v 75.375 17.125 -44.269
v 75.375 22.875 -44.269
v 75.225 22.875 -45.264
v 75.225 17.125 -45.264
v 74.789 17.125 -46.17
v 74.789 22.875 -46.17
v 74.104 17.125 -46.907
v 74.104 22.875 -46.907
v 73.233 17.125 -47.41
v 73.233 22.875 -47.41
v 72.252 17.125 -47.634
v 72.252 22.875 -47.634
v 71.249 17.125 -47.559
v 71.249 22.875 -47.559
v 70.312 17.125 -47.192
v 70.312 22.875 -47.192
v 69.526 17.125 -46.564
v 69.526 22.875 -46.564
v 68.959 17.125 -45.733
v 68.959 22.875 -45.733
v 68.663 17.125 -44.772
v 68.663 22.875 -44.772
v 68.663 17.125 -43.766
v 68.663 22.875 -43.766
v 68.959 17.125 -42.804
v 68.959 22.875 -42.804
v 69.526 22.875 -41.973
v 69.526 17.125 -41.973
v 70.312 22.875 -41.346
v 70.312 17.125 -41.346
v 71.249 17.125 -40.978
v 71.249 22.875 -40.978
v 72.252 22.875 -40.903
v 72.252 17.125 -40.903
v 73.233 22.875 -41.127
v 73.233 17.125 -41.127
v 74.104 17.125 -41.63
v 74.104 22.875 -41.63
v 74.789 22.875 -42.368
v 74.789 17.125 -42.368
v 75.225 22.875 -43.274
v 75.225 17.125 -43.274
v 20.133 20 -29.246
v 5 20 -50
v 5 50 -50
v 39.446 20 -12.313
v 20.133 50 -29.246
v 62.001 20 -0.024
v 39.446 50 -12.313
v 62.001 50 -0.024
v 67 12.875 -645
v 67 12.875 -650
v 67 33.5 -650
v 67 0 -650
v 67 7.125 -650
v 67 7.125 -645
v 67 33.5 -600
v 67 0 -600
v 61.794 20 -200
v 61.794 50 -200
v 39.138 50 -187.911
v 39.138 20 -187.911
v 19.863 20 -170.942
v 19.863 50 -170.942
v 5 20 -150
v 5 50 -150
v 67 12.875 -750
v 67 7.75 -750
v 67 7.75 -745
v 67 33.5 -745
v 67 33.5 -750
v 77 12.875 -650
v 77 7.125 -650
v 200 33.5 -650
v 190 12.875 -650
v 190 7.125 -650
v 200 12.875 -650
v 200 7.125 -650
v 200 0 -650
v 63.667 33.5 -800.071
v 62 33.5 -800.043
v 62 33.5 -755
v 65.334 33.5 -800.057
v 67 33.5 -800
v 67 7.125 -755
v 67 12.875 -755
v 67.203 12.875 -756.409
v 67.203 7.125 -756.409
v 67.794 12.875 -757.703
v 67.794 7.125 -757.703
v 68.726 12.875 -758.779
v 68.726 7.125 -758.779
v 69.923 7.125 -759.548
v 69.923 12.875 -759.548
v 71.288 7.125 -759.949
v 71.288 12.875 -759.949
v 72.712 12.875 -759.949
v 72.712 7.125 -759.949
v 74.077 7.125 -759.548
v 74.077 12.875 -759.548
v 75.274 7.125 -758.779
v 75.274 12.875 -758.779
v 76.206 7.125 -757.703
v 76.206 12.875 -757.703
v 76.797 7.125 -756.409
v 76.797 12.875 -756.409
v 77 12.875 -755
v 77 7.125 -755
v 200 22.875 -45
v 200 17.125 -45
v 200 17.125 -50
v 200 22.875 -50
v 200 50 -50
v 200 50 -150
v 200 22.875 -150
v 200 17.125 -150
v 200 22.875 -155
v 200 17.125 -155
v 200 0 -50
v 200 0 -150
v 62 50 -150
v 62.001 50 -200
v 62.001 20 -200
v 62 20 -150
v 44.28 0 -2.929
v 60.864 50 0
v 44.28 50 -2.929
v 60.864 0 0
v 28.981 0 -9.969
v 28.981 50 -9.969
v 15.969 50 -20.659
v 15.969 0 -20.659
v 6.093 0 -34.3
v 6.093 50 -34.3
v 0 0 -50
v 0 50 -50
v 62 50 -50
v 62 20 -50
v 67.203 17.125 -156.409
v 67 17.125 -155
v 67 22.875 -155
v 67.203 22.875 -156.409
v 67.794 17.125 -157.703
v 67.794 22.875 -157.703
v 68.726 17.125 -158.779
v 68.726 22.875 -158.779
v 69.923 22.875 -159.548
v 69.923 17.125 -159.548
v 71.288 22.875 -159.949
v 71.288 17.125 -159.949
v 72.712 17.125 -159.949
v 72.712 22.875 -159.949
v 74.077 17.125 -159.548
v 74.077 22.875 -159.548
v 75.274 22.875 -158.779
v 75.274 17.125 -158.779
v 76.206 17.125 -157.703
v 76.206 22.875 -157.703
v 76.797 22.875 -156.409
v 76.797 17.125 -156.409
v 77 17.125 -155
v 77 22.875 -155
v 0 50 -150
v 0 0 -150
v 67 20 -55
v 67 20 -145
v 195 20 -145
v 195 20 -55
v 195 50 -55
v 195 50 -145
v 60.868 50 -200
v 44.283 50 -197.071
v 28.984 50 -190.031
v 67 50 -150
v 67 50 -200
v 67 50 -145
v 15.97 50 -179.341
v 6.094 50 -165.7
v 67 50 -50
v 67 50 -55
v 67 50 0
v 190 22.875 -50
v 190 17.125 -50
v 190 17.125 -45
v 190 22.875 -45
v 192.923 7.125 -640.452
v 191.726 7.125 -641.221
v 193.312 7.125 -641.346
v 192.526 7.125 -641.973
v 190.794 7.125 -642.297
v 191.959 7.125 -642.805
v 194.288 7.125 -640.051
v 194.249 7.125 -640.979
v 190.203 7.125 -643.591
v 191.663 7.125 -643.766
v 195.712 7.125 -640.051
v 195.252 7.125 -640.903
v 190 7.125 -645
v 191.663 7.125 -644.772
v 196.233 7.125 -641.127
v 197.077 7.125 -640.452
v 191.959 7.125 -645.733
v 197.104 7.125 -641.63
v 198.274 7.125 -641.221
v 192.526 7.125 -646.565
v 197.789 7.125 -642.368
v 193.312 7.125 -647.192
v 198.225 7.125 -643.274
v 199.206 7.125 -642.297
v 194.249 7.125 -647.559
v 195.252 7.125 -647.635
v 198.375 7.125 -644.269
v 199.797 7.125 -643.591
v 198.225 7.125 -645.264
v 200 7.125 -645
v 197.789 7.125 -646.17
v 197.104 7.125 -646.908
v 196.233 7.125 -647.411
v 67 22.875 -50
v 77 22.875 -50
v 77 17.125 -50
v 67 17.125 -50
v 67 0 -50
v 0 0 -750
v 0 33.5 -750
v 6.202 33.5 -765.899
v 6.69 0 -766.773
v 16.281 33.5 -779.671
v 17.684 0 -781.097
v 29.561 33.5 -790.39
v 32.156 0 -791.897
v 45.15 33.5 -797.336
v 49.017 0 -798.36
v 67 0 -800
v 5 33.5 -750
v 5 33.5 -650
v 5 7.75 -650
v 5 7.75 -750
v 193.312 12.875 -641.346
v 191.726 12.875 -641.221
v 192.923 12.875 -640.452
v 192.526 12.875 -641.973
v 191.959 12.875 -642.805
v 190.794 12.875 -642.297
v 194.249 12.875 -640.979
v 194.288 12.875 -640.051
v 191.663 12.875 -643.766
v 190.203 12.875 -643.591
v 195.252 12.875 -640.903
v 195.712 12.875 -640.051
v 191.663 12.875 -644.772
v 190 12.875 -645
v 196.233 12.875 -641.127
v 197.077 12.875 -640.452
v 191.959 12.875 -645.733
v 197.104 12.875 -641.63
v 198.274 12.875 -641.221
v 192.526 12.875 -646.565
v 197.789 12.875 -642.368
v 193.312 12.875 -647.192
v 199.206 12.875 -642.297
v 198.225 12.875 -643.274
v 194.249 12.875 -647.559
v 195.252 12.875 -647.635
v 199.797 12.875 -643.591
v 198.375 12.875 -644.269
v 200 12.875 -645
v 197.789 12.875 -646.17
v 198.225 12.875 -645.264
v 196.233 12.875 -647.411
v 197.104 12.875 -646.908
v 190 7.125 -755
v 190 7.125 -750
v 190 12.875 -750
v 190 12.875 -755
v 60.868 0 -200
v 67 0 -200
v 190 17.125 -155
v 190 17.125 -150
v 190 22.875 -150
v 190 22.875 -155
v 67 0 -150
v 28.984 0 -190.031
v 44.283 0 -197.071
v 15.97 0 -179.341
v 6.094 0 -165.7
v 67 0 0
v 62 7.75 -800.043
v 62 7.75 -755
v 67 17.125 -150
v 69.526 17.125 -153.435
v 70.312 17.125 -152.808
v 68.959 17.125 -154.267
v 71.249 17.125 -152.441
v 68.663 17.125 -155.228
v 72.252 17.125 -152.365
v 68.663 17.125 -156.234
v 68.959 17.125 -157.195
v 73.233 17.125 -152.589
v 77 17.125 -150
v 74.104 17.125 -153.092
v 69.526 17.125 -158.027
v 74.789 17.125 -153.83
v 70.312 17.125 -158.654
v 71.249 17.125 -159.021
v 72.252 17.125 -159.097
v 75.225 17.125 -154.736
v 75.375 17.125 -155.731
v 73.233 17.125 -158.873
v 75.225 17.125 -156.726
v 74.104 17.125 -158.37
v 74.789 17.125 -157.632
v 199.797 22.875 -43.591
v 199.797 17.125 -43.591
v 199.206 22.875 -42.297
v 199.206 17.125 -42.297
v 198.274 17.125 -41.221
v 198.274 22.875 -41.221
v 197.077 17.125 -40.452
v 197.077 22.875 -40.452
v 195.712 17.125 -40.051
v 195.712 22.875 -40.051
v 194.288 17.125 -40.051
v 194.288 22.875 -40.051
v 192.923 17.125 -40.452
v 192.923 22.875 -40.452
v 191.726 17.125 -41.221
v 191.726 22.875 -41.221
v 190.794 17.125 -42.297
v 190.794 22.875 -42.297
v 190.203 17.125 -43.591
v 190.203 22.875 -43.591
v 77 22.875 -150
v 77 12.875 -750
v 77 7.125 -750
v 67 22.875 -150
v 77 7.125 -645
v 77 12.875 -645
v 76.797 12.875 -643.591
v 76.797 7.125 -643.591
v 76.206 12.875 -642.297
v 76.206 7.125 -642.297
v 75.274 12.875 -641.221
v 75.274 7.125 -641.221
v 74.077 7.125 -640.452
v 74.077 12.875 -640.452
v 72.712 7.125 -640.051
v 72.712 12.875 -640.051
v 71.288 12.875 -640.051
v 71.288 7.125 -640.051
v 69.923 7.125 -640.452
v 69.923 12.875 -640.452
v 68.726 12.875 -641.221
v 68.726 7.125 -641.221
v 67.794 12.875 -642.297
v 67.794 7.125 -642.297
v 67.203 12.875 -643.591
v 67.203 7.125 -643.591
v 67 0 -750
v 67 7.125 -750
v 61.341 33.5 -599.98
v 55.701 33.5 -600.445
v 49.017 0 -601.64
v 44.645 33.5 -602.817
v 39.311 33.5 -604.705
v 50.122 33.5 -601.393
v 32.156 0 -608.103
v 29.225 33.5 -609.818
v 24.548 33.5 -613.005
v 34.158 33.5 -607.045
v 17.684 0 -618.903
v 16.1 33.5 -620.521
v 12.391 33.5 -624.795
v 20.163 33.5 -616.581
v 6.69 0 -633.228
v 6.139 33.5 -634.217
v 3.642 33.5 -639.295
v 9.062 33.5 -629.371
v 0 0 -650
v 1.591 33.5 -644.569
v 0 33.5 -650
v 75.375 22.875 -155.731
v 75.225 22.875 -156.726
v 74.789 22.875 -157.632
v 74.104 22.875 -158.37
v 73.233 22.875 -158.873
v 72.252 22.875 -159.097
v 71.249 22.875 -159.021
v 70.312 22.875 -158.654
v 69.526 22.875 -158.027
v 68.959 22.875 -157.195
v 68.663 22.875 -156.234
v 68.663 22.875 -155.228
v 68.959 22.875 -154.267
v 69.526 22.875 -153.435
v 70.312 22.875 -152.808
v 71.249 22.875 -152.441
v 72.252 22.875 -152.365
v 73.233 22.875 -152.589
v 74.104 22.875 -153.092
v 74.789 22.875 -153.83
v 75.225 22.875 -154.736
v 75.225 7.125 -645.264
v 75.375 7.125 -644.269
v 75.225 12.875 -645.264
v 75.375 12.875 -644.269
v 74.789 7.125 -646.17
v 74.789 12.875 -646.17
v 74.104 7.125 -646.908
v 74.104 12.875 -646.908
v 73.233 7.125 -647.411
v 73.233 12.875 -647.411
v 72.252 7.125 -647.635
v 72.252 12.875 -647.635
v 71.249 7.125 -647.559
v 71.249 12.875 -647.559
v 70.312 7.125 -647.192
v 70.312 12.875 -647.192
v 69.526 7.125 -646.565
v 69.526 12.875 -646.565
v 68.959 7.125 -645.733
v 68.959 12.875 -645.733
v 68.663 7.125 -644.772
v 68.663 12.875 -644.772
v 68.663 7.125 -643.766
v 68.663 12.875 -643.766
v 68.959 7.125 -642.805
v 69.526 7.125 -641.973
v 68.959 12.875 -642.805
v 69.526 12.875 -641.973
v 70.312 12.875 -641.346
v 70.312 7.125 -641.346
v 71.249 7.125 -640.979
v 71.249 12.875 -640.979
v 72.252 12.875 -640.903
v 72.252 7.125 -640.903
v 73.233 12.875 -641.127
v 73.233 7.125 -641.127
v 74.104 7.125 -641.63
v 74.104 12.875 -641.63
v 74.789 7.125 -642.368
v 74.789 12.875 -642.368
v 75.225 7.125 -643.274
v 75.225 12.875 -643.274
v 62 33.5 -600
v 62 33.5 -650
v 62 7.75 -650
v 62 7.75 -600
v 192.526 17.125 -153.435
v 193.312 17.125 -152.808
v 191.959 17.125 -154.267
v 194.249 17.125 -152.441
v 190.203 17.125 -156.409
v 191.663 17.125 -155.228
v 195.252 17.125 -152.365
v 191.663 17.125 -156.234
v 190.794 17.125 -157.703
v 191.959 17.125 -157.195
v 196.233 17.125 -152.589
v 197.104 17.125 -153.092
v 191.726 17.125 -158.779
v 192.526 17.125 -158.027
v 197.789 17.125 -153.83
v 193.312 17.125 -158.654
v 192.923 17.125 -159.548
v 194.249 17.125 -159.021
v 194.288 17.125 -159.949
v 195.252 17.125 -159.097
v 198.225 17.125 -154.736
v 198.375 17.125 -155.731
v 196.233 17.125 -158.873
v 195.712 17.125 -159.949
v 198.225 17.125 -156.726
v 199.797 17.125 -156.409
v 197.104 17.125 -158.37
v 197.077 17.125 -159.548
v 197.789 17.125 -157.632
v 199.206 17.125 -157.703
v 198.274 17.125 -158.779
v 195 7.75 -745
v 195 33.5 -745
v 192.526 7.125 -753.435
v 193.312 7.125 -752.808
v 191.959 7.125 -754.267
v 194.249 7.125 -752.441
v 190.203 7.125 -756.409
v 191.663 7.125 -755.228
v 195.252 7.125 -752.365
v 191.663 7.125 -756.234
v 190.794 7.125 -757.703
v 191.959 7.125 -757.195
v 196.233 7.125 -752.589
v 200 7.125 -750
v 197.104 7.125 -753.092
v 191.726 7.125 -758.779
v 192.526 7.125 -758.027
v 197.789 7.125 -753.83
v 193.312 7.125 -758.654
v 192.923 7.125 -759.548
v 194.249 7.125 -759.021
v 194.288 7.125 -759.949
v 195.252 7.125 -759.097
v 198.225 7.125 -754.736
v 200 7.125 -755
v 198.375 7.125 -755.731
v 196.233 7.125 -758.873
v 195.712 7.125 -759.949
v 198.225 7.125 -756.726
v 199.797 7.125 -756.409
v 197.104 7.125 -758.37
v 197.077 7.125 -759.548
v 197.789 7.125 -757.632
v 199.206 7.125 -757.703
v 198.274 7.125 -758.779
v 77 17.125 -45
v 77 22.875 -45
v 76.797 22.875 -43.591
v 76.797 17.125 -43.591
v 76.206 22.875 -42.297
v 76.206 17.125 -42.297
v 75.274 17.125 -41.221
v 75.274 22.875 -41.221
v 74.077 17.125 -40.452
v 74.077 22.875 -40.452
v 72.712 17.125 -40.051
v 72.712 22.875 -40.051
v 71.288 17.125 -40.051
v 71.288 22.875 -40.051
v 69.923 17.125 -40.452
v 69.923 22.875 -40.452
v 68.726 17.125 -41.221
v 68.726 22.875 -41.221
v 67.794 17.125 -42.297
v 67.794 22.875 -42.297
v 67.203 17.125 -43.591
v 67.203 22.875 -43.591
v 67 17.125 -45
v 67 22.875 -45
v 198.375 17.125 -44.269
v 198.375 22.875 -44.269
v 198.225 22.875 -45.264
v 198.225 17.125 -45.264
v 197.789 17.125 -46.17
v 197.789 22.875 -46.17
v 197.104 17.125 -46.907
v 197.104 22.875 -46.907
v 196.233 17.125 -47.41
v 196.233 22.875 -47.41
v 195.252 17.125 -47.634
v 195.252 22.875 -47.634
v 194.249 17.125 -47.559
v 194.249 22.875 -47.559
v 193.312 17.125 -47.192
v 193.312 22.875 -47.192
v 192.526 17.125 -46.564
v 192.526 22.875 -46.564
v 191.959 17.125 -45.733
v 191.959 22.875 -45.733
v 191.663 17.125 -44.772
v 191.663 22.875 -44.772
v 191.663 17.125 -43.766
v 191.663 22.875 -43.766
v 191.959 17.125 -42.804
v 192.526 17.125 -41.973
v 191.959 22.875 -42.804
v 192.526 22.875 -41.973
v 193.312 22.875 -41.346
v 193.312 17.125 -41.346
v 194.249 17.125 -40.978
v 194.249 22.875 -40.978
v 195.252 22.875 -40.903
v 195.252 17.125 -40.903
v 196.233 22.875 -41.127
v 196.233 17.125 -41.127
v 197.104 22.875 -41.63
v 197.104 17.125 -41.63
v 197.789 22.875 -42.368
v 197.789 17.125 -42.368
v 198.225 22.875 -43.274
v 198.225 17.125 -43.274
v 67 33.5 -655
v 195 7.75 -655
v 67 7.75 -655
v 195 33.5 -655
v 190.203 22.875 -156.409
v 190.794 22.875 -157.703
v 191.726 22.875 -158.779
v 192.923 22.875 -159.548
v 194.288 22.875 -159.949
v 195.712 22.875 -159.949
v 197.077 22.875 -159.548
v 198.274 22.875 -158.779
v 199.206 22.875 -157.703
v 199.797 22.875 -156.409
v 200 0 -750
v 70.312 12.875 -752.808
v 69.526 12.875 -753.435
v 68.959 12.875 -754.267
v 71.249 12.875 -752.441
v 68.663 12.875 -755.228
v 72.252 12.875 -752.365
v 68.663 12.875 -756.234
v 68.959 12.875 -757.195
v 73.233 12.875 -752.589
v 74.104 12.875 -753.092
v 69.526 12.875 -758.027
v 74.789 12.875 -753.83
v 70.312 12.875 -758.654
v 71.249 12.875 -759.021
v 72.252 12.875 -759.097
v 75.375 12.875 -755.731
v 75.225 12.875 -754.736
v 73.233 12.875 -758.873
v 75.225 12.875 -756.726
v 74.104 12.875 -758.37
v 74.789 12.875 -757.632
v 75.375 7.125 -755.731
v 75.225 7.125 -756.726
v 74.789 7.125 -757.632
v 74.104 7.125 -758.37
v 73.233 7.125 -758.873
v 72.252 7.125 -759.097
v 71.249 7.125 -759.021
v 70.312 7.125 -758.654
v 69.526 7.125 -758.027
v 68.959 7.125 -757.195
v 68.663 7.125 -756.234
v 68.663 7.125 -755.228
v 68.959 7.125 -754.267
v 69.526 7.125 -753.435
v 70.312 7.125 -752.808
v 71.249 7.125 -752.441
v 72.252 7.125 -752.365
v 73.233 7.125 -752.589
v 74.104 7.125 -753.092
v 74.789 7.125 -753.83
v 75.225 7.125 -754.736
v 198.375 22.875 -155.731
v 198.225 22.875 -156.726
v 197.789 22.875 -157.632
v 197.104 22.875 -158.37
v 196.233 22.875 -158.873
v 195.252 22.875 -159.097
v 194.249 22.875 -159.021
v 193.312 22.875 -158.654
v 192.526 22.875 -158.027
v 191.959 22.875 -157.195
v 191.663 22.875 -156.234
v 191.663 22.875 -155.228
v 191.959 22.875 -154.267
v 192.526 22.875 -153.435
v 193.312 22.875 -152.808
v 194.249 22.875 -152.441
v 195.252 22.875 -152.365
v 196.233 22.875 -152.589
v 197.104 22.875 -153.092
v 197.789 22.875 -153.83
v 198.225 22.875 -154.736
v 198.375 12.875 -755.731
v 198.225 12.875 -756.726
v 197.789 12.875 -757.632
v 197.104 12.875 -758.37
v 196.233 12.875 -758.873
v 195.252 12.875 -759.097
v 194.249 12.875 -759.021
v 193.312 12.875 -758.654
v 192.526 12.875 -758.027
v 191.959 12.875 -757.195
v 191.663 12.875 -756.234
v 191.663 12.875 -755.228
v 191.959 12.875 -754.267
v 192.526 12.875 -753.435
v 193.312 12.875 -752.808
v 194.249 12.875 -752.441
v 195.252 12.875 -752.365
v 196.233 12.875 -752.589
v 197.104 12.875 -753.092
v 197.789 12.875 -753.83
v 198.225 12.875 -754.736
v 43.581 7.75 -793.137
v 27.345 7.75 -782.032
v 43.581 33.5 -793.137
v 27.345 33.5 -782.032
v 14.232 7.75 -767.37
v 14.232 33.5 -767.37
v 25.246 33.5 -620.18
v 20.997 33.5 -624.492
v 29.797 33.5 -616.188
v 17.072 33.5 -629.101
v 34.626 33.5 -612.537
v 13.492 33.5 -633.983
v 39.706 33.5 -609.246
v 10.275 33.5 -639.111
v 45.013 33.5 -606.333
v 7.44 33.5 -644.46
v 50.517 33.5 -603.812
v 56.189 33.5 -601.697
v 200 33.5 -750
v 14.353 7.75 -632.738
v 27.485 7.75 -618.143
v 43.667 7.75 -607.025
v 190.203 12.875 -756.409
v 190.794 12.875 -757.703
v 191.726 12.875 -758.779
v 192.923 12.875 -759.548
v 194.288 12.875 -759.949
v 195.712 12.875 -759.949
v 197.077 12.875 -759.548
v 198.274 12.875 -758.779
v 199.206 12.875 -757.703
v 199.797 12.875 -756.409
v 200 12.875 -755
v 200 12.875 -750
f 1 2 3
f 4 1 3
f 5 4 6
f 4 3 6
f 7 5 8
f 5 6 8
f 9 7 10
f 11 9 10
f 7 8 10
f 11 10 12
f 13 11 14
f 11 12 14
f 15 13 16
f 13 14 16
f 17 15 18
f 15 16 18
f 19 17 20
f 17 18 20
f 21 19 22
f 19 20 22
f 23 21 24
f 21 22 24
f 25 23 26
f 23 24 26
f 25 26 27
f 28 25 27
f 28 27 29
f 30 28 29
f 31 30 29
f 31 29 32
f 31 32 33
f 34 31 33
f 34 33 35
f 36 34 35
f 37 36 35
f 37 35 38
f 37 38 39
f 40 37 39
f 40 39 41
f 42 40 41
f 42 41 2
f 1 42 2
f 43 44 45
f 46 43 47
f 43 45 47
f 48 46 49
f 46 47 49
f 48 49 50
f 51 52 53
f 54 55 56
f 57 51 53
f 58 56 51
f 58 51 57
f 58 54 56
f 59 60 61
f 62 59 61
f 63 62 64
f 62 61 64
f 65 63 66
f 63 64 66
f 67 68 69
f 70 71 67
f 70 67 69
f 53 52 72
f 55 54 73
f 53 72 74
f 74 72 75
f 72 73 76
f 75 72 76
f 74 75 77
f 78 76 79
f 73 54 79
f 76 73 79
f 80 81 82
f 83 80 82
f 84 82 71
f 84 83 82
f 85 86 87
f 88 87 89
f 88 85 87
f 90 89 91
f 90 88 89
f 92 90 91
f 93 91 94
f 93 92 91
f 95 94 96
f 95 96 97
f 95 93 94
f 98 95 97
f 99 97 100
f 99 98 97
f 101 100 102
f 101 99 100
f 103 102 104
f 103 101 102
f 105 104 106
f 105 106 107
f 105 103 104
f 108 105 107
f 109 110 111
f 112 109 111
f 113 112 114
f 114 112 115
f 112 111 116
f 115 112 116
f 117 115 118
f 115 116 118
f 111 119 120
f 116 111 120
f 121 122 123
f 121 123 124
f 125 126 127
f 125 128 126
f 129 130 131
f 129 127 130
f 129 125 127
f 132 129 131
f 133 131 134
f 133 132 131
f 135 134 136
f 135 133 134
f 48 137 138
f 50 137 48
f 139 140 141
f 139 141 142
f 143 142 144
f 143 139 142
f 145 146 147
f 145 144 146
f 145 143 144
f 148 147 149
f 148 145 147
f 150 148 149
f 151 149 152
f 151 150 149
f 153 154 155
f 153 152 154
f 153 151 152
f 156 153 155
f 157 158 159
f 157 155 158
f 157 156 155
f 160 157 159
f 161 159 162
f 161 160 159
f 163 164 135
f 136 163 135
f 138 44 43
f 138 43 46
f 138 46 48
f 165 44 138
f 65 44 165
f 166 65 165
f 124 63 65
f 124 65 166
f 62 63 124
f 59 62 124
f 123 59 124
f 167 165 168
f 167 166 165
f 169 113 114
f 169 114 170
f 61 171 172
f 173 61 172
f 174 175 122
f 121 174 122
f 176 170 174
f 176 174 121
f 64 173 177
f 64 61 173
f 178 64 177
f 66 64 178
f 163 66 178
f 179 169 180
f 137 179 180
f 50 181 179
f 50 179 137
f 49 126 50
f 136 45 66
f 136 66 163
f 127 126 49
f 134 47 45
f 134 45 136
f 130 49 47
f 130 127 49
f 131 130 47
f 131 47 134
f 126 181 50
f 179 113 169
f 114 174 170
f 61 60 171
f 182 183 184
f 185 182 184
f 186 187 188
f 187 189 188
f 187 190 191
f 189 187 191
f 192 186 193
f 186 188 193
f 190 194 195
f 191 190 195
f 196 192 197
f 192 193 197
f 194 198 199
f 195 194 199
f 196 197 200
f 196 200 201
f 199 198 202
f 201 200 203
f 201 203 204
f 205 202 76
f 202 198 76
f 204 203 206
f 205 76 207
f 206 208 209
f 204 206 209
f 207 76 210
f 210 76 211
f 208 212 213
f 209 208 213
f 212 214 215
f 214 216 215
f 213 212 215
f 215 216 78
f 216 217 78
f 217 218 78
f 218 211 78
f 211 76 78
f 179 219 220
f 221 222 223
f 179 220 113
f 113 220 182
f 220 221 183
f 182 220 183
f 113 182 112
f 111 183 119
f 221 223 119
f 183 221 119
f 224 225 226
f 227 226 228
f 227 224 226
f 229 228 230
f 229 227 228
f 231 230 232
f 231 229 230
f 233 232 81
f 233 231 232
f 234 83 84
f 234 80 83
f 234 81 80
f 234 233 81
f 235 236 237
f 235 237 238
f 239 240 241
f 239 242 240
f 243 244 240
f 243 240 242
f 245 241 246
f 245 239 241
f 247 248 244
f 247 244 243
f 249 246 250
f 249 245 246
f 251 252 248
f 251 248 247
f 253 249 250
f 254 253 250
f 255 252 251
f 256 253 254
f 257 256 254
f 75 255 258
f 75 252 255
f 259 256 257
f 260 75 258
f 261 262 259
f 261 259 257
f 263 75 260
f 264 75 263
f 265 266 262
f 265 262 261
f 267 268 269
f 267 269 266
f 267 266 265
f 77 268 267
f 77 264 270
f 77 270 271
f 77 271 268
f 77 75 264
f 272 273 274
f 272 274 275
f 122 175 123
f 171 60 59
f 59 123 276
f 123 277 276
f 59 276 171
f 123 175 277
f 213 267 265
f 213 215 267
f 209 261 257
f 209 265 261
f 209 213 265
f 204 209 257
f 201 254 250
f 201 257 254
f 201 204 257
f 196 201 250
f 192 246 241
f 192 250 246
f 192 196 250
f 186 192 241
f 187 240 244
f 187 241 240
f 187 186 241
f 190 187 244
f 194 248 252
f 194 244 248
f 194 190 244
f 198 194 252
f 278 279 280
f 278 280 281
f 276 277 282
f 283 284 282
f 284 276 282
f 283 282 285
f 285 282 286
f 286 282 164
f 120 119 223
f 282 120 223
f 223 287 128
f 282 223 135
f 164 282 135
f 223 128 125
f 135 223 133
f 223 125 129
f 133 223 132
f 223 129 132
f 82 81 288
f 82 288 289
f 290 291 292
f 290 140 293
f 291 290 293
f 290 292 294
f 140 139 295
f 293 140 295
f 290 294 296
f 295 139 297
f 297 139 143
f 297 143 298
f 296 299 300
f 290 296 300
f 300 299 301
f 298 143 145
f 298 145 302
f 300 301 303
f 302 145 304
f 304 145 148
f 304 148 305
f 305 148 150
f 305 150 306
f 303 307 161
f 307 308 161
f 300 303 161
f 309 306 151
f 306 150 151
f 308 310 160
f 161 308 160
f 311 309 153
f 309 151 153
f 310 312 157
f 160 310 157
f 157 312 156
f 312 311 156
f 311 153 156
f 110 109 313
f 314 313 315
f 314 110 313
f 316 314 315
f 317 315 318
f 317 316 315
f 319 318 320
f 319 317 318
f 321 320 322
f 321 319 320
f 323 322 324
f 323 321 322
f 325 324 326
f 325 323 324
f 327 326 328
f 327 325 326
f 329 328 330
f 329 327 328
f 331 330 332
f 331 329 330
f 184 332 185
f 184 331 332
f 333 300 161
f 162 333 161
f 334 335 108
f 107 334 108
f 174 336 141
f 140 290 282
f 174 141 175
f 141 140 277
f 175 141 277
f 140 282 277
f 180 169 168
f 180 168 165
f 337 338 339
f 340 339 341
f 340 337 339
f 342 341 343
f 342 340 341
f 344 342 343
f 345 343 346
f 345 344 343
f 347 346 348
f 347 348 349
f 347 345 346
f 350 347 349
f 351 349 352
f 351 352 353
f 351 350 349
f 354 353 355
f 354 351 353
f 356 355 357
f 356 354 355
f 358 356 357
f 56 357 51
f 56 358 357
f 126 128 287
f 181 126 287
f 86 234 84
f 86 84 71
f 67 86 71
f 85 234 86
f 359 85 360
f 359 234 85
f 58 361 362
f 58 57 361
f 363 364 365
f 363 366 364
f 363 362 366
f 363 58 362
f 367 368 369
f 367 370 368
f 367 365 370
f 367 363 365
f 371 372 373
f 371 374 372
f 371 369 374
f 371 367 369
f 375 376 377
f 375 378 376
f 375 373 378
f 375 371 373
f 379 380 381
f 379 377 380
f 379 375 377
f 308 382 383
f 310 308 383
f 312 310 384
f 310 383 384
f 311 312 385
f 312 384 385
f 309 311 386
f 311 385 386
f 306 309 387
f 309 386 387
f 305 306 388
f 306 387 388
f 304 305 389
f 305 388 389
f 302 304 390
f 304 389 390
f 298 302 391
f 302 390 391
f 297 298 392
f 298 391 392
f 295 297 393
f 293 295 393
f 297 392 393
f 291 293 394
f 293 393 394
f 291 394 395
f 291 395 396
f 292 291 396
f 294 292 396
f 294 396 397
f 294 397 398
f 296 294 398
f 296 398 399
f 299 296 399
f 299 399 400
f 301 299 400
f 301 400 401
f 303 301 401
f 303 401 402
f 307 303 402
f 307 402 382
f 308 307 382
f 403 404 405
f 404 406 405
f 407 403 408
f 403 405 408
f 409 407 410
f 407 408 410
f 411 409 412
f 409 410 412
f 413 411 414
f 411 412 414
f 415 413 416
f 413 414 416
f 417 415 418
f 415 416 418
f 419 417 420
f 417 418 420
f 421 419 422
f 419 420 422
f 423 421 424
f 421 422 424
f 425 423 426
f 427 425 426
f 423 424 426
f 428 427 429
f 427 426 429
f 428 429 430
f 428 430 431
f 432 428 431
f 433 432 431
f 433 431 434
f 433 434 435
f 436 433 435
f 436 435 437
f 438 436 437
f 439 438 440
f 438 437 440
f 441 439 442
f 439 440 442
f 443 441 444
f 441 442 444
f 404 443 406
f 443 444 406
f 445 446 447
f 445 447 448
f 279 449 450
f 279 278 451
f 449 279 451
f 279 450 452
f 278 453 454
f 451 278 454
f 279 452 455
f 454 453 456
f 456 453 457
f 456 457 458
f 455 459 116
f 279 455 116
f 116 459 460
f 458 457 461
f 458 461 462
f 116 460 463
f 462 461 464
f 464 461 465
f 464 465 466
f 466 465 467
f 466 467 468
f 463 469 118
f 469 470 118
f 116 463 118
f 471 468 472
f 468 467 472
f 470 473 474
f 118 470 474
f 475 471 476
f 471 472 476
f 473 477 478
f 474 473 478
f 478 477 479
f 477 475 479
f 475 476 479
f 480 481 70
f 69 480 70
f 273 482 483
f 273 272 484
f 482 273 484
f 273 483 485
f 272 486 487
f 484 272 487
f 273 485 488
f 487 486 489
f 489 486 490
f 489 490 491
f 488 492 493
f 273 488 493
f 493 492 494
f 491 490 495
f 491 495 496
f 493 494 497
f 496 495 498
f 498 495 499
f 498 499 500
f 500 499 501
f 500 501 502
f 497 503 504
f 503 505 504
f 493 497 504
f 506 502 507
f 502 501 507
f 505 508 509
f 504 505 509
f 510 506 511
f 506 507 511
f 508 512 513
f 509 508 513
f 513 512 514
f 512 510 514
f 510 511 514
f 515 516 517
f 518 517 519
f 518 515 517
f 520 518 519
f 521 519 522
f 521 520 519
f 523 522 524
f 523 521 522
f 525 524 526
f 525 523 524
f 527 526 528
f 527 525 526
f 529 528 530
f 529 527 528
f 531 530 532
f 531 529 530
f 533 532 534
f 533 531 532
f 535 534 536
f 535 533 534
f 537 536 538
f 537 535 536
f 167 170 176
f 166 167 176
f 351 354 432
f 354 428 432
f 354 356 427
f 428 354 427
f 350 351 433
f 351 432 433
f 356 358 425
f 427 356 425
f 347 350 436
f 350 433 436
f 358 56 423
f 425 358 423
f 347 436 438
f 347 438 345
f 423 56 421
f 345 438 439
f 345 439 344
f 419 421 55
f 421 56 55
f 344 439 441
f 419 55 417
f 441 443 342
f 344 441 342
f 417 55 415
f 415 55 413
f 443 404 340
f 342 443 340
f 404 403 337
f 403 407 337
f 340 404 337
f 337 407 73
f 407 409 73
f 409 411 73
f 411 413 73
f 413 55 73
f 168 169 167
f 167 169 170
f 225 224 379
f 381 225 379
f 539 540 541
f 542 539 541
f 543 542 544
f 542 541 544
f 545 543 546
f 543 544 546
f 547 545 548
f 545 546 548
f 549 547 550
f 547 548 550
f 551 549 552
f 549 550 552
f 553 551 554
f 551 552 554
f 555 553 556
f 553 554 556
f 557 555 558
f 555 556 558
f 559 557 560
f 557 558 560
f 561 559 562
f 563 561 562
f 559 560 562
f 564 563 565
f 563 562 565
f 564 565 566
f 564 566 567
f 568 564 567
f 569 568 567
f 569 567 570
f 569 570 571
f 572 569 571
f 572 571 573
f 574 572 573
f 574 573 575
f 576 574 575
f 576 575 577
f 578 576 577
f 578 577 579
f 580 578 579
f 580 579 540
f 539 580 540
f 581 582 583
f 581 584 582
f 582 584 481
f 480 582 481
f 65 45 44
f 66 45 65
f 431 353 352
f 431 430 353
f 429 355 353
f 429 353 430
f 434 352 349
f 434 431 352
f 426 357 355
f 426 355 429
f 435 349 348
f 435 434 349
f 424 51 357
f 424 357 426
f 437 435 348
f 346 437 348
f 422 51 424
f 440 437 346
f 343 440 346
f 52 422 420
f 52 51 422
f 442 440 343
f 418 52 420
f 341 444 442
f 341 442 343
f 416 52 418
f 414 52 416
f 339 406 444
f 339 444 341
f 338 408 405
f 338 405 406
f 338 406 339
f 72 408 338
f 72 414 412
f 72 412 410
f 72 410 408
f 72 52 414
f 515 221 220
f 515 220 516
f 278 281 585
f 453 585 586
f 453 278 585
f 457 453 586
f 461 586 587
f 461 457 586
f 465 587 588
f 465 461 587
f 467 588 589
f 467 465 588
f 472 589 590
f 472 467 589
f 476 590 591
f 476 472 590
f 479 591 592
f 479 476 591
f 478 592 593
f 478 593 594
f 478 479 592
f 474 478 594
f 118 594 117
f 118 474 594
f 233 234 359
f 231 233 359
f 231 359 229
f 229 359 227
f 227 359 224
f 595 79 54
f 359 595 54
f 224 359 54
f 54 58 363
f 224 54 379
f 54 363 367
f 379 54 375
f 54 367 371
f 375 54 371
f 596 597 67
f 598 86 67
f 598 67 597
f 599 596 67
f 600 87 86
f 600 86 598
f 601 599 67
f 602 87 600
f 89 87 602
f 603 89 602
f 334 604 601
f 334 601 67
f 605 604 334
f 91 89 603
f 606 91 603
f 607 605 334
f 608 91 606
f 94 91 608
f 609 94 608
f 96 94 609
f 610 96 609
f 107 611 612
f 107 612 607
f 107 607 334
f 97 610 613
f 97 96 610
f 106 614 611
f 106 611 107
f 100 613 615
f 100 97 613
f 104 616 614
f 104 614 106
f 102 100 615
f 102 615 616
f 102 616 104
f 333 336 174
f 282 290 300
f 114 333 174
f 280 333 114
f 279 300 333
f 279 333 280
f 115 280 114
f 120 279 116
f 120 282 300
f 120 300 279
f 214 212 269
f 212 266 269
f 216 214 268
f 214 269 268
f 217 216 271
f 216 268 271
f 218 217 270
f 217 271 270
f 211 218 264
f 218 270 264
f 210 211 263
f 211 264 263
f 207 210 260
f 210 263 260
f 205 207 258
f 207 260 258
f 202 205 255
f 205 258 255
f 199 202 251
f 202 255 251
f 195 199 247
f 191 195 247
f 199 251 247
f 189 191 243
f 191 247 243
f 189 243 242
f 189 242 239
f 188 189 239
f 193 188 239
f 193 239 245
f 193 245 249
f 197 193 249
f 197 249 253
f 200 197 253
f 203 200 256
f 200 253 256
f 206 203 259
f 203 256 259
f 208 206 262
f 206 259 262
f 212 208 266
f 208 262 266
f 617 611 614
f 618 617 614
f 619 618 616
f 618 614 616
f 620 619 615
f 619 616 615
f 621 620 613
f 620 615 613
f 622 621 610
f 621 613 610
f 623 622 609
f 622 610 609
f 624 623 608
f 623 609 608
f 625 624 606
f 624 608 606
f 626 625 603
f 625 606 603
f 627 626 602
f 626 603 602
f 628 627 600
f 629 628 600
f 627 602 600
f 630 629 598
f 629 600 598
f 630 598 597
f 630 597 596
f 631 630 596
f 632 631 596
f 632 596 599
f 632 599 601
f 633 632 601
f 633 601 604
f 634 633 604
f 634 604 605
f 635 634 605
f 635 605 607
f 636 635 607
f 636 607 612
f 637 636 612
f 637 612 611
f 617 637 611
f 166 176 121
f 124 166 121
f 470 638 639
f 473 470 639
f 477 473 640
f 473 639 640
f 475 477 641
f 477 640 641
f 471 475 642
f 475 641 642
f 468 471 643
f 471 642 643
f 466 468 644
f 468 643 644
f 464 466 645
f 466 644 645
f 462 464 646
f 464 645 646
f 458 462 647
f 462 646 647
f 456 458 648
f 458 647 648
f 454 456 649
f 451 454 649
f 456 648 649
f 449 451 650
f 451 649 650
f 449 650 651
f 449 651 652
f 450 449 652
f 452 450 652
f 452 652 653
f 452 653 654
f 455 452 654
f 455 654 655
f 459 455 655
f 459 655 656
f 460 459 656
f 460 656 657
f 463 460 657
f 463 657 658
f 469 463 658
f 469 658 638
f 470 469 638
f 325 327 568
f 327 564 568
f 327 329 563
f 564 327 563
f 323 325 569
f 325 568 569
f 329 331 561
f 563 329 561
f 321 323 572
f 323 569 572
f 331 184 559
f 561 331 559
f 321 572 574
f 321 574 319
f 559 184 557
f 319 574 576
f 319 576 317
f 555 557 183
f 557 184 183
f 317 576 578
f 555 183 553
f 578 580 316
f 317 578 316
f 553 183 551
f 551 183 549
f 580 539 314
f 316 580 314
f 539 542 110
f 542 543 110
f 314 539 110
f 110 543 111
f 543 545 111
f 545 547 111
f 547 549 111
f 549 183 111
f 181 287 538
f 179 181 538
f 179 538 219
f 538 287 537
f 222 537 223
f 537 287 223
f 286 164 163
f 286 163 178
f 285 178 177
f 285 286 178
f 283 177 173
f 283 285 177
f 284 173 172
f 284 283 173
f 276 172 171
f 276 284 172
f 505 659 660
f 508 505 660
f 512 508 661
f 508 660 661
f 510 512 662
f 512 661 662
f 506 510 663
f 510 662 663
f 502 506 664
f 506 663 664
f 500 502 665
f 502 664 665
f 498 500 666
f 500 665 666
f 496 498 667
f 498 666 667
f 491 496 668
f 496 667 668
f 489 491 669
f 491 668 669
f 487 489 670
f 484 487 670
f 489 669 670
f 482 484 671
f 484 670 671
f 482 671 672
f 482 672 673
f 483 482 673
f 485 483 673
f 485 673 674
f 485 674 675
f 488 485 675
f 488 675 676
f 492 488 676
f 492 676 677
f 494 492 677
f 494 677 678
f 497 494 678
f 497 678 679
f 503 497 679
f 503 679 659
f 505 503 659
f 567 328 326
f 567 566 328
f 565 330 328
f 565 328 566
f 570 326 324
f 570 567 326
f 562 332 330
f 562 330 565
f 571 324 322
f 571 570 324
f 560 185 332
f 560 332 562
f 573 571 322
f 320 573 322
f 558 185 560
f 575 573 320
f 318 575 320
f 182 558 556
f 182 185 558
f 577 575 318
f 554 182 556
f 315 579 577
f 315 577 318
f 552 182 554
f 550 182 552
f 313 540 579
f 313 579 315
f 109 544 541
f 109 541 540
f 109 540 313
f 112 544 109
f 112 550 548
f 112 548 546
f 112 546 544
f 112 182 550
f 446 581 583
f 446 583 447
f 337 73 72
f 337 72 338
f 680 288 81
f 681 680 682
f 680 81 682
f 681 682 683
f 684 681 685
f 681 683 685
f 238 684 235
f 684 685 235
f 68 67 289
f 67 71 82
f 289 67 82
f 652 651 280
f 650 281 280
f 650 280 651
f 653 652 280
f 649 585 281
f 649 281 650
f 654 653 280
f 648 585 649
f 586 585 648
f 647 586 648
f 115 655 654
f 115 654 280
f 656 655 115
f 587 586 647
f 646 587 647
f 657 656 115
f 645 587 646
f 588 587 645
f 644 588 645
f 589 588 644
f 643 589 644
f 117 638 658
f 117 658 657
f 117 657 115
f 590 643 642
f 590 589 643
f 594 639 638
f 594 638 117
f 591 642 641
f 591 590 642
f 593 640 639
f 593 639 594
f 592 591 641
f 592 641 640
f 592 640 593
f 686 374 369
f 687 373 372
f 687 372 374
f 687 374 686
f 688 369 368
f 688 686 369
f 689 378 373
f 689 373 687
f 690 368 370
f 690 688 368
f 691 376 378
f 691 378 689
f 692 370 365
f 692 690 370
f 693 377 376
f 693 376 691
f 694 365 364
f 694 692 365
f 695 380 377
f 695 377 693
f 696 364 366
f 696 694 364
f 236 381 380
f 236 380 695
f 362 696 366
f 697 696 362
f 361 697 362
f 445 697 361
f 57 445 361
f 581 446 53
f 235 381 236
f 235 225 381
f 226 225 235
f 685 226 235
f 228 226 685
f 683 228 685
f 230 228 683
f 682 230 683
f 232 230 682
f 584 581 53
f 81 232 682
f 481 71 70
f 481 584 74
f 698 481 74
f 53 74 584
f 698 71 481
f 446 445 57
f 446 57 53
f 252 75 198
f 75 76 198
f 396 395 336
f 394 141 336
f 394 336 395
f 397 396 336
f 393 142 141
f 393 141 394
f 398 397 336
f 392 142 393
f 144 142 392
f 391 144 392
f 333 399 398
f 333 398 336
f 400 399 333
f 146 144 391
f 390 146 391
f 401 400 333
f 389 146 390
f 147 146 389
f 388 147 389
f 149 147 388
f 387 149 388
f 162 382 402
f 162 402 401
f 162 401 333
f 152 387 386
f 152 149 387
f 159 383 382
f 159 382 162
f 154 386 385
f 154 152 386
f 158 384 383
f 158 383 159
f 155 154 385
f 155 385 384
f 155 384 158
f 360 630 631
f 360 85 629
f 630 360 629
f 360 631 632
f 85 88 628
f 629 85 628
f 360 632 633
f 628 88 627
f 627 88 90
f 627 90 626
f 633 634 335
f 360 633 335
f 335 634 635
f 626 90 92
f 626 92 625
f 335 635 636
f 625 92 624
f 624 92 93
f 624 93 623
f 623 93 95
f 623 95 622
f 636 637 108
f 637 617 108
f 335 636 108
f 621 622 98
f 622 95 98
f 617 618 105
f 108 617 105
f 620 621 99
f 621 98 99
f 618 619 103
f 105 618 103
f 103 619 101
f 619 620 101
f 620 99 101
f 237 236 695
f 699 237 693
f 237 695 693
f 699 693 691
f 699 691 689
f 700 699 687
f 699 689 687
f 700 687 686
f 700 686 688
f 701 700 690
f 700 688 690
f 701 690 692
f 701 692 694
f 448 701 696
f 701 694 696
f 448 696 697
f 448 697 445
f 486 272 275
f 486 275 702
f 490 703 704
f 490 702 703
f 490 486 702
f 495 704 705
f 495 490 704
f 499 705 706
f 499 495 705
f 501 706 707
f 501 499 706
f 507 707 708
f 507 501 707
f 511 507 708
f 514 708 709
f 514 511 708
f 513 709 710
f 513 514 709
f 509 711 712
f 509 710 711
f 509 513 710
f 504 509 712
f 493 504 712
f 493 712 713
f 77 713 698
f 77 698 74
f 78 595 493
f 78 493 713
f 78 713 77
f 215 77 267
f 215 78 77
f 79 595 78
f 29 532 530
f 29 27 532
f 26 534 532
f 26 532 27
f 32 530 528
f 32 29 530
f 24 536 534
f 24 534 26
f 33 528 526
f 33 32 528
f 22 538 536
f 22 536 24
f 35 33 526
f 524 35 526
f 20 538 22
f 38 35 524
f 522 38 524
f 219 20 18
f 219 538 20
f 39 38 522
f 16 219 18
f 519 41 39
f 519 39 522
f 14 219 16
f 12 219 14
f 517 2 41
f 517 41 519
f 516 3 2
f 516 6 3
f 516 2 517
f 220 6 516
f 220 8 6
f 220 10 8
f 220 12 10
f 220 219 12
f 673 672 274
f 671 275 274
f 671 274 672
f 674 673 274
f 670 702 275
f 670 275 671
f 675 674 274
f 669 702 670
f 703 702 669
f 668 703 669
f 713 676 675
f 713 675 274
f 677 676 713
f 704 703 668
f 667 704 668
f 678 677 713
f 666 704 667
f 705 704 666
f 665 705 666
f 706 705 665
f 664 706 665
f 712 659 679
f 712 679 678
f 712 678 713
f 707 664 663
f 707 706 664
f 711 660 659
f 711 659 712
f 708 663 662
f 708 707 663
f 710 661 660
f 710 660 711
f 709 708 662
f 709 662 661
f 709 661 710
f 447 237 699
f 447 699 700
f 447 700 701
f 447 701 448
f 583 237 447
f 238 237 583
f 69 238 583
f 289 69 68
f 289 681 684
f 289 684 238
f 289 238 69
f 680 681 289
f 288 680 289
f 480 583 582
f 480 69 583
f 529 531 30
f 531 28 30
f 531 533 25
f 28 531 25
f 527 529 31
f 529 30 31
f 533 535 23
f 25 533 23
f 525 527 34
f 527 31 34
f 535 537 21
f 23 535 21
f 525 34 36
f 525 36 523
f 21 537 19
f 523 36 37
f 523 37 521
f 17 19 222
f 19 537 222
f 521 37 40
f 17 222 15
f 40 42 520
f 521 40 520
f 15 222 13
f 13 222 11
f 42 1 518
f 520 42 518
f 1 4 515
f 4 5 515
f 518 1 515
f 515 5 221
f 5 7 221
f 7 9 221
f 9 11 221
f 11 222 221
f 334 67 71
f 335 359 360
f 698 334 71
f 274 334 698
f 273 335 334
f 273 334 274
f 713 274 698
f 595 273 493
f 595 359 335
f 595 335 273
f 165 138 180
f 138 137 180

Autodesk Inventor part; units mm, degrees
ref_plane "YZ Plane" through (0, 0, 0) normal (1, 0, 0) x (0, 1, 0)
ref_plane "XZ Plane" through (0, 0, 0) normal (0, 1, 0) x (-1, 0, 0)
ref_plane "XY Plane" through (0, 0, 0) normal (0, 0, 1) x (1, 0, 0)
sketch "Sketch1" plane through (0, 0, 0) normal (0, 1, 0) x (-1, 0, 0)
  line L0 (-60.8639, 0) -> (-200, 0)
  line L1 (-200, 0) -> (-200, -200)
  line L2 (-200, -200) -> (0, -200)
  line L3 (0, -200) -> (0, 0)
  line L4 (0, -200) -> (-200, -200)
  line L5 (-200, -200) -> (-200, -400)
  line L6 (-200, -400) -> (0, -400)
  line L7 (0, -400) -> (0, -200)
  line L8 (-60.8639, 0) -> (-67, 0)
  line L9 (0, -200) -> (0, -100)
  line L10 (0, -50) -> (0, -100)
  line L11 (0, -100) -> (0, -50)
  line L12 (0, -50) -> (0, -150)
  line L13 (0, -150) -> (-67, -150)
  line L14 (0, -50) -> (-67, -50)
  line L15 (-14.5617, -10.867) -> (0, 0)
  line L16 (-67, -150) -> (0, -200)
  arc A0 (0, -50) -> (-67, 0) centre (-63.932, -65.7788) ccw
  line L17 (0, -200) -> (15.754, -200)
  line L18 (15.754, -200) -> (0, -200)
  line L19 (0, -200) -> (0, -184.246)
  line L20 (0, -184.246) -> (-21.1104, -184.246)
  line L21 (-21.1104, -184.246) -> (-21.1104, -200)
  arc A1 (-67, -200) -> (0, -150) centre (-63.9339, -134.2186) ccw
  line L22 (-67, -50) -> (-200, -50)
  line L23 (-67, -150) -> (-200, -150)
  line L24 (-67, 0) -> (-67, -50)
  line L25 (-67, -150) -> (-67, -200)
  line L26 (-200, -800) -> (-200, -600)
  line L27 (0, -750) -> (0, -700)
  line L28 (0, -750) -> (0, -650)
  line L29 (0, -650) -> (-67, -650)
  line L30 (0, -750) -> (-67, -750)
  line L31 (-67, -650) -> (0, -600)
  arc A2 (-67, -800) -> (0, -750) centre (-63.932, -734.2212) ccw
  arc A3 (0, -650) -> (-67, -600) centre (-63.9339, -665.7814) ccw
  line L32 (-67, -750) -> (-200, -750)
  line L33 (-67, -650) -> (-200, -650)
  line L34 (-67, -800) -> (-67, -750)
  line L35 (-67, -650) -> (-67, -600)
  point P0 (-60.8677, -200)
  dimension "d0" = 200
  dimension "d1" = 200
  dimension "d2" = 200
  dimension "d3" = 200
  dimension "d4" = 67
  dimension "d5" = 100
  dimension "d6" = 50
  dimension "d7" = 100
  dimension "d8" = 15.754
  dimension "d9" = 15.754
extrude "Extrusion1" add sketch "Sketch1" along normal blind 50 contours A0 L14 L24 L0 | L3 L13 L23 L1 L22 L14 | A1 L16 L13 | L16 A1 L2 L25 | L26 L33 L29 L28 L27 L30 L32 | L30 A2 L34 | L31 A3 L29 | L35 A3 L31
sketch "Sketch2" plane through (0, 50, 0) normal (0, 1, 0) x (1, 0, 0)
  line L0 (67, 50) -> (200, 50) projected
  line L1 (200, 50) -> (200, 150)
  line L2 (200, 150) -> (67, 150)
  line L3 (67, 150) -> (67, 199.2984)
  line L4 (67, 199.2984) -> (67, 200.0458)
  line L5 (0, 150) -> (0, 50) projected
  line L6 (0, 50) -> (0, 150)
  line L7 (67, 50) -> (200, 50)
  arc A0 (0, 50) -> (63.932, 0) centre (63.792, 65.694) ccw
  arc A1 (60.8677, 200) -> (0, 150) centre (63.9339, 134.2186) ccw projected
  arc A2 (67, 200.0458) -> (0, 150) centre (64.0367, 134.1412) ccw
  line L8 (107.1865, 50) -> (107.1865, 55)
  line L9 (107.1865, 55) -> (67, 55)
  line L10 (200, 55) -> (195, 55)
  line L11 (195, 150) -> (195, 145)
  line L12 (195, 145) -> (67, 145)
  line L13 (67, 145) -> (67, 55)
  line L14 (67, 55) -> (195, 55)
  line L15 (195, 55) -> (195, 145)
  line L16 (0, 102.5601) -> (5, 102.5601)
  line L17 (5, 102.5601) -> (5, 150)
  line L18 (67, 150) -> (67, 200) projected
  line L19 (67, 150) -> (62, 150)
  line L20 (62, 150) -> (5, 150)
  line L21 (62, 150) -> (62, 145)
  line L22 (62, 145) -> (72.629, 145)
  line L23 (67, 50) -> (62, 50)
  line L24 (62, 50) -> (62, 55)
  line L25 (62, 50) -> (5, 50)
  line L26 (5, 50) -> (5, 104.6986)
  line L27 (67, 55) -> (62, 55)
  line L28 (62, 50) -> (67, 55)
  line L29 (67, 145) -> (62, 150)
  line L30 (67, 200) -> (62.0007, 200.081)
  line L31 (62.0007, 200.081) -> (62, 150)
  arc A3 (62.0007, 200.081) -> (5, 150) centre (102.4081, 96.6117) ccw
  line L32 (62.0007, 50.0007) -> (62.0007, 0.0243)
  arc A4 (5, 50) -> (62.0007, 0.0243) centre (106.1149, 107.8339) ccw
  point P0 (0, 0)
  point P1 (62.0007, 50)
  dimension "d12" = 5
  dimension "d13" = 5
  dimension "d14" = 5
  dimension "d15" = 5
  dimension "d16" = 5
  dimension "d17" = 5
  dimension "d18" = 5
extrude "Extrusion2" cut sketch "Sketch2" against normal blind 30 contours L25 L26 L17 L20 L21 L22 L13 L27 L24 | L32 A4 L25 | L24 L27 L28 | L9 L13 L12 L15 L14 | L22 L21 L29 | L20 A3 L31
ref_plane "Work Plane1" through (0, 10, 0) normal (0, 1, 0) x (1, 0, 0)
sketch "Sketch3" plane through (0, 20, 0) normal (0, 1, 0) x (1, 0, 0)
  line L0 (67, 150) -> (200, 150) projected
  line L1 (200, 150) -> (200, 50) projected
  line L2 (200, 50) -> (67, 50) projected
  line L3 (67, 50) -> (67, 0) projected
  line L4 (67, 0) -> (60.8639, 0) projected
  arc A0 (0, 50) -> (60.8639, 0) centre (63.932, 65.7788) ccw projected
  line L5 (0, 50) -> (0, 150) projected
  arc A1 (60.8677, 200) -> (0, 150) centre (63.9339, 134.2186) ccw projected
  line L6 (60.8677, 200) -> (61.7939, 200) projected
  arc A2 (61.7939, 200) -> (5, 150) centre (102.4081, 96.6117) ccw projected
  line L7 (5, 150) -> (5, 50) projected
  arc A3 (5, 50) -> (62.0007, 0.0243) centre (106.1149, 107.8339) ccw projected
  line L8 (62.0007, 0.0243) -> (62.0007, 50) projected
  line L9 (62.0007, 50) -> (62, 50) projected
  line L10 (62, 50) -> (67, 55) projected
  line L11 (67, 55) -> (195, 55) projected
  line L12 (195, 55) -> (195, 145) projected
  line L13 (195, 145) -> (67, 145) projected
  line L14 (67, 145) -> (62, 150) projected
  line L15 (62, 150) -> (62.0007, 200) projected
  line L16 (61.7939, 200) -> (62.0007, 200) projected
  line L17 (67, 200) -> (67, 150) projected
  line L18 (62.0007, 200) -> (67, 200) projected
  arc A4 (0, 650) -> (67, 600) centre (63.9339, 665.7814) ccw projected
  line L19 (0, 650) -> (0, 750) projected
  arc A5 (67, 800) -> (0, 750) centre (63.932, 734.2212) ccw projected
  line L20 (67, 800) -> (67, 750) projected
  line L21 (67, 750) -> (200, 750) projected
  line L22 (200, 750) -> (200, 650) projected
  line L23 (200, 650) -> (67, 650) projected
  line L24 (67, 650) -> (67, 600) projected
  line L25 (67, 150) -> (200, 150) projected
  line L26 (200, 150) -> (200, 50) projected
  line L27 (200, 50) -> (67, 50) projected
  line L28 (67, 50) -> (67, 0) projected
  line L29 (67, 0) -> (60.8639, 0) projected
  arc A6 (0, 50) -> (60.8639, 0) centre (63.932, 65.7788) ccw projected
  line L30 (0, 50) -> (0, 150) projected
  arc A7 (60.8677, 200) -> (0, 150) centre (63.9339, 134.2186) ccw projected
  line L31 (60.8677, 200) -> (61.7939, 200) projected
  arc A8 (61.7939, 200) -> (5, 150) centre (102.4081, 96.6117) ccw projected
  line L32 (5, 150) -> (5, 50) projected
  arc A9 (5, 50) -> (62.0007, 0.0243) centre (106.1149, 107.8339) ccw projected
  line L33 (62.0007, 0.0243) -> (62.0007, 50) projected
  line L34 (62.0007, 50) -> (62, 50) projected
  line L35 (62, 50) -> (67, 55) projected
  line L36 (67, 55) -> (195, 55) projected
  line L37 (195, 55) -> (195, 145) projected
  line L38 (195, 145) -> (67, 145) projected
  line L39 (67, 145) -> (62, 150) projected
  line L40 (62, 150) -> (62.0007, 200) projected
  line L41 (61.7939, 200) -> (62.0007, 200) projected
  line L42 (67, 200) -> (67, 150) projected
  line L43 (62.0007, 200) -> (67, 200) projected
  arc A10 (0, 650) -> (67, 600) centre (63.9339, 665.7814) ccw projected
  line L44 (0, 650) -> (0, 750) projected
  arc A11 (67, 800) -> (0, 750) centre (63.932, 734.2212) ccw projected
  line L45 (67, 800) -> (67, 750) projected
  line L46 (67, 750) -> (200, 750) projected
  line L47 (200, 750) -> (200, 650) projected
  line L48 (200, 650) -> (67, 650) projected
  line L49 (67, 650) -> (67, 600) projected
  line L50 (67, 50) -> (200, 50) projected
  line L51 (67, 50) -> (77, 50)
  line L52 (77, 50) -> (77, 40)
  line L53 (77, 40) -> (67, 40)
  line L54 (67, 40) -> (67, 50)
  line L55 (200, 50) -> (190, 50)
  line L56 (190, 50) -> (190, 40)
  line L57 (190, 40) -> (200, 40)
  line L58 (200, 40) -> (200, 50)
  line L59 (200, 50) -> (200, 150) projected
  line L60 (200, 150) -> (190, 150)
  line L61 (190, 150) -> (190, 160)
  line L62 (190, 160) -> (200, 160)
  line L63 (200, 160) -> (200, 150)
  line L64 (67, 150) -> (77, 150)
  line L65 (77, 150) -> (77, 160)
  line L66 (77, 160) -> (67, 160)
  line L67 (67, 160) -> (67, 150)
  circle A12 centre (72, 45) radius 5
  circle A13 centre (195, 45) radius 5
  circle A14 centre (195, 155) radius 5
  circle A15 centre (72, 155) radius 5
  point P0 (0, 0)
  point P1 (67, 45)
  point P2 (77, 45)
  point P3 (190, 45)
  point P4 (200, 45)
  point P5 (190, 155)
  point P6 (200, 155)
  point P7 (77, 155)
  point P8 (67, 155)
  dimension "d21" = 10
  dimension "d22" = 10
  dimension "d23" = 10
  dimension "d24" = 10
  dimension "d25" = 10
  dimension "d26" = 10
  dimension "d27" = 10
extrude "Extrusion3" add sketch "Sketch3" along normal mid plane 5.75 contours L0 A15 L65 | L61 A14 L0 | L0 L17 A15 | A15 | A14 L63 L0 | A14 | L58 A13 L2 | A13 L56 L2 | A13 | L52 A12 L2 | A12 L3 L2 | A12
sketch "Sketch4" plane through (0, 22.875, 0) normal (0, 1, 0) x (1, 0, 0)
  circle A0 centre (72, 44.2688) radius 3.375
  arc A1 (190, 45) -> (200, 45) centre (195, 45) ccw projected
  line L0 (195, 40) -> (195, 44.2688)
  circle A2 centre (195, 44.2688) radius 3.375
  arc A3 (200, 155) -> (190, 155) centre (195, 155) ccw projected
  line L1 (195, 160) -> (195, 155.731)
  circle A4 centre (195, 155.731) radius 2.875
  circle A5 centre (195, 155.731) radius 3.375
  arc A6 (77, 155) -> (67, 155) centre (72, 155) ccw projected
  line L2 (72, 160) -> (72, 155.731)
  circle A7 centre (72, 155.731) radius 3.375
  point P0 (0, 0)
  dimension "d30" = 6.75
  dimension "d31" = 4.269
  dimension "d32" = 5.75
  dimension "d33" = 6.75
extrude "Extrusion4" cut sketch "Sketch4" against normal blind 5.75 contours A0 | A2 | A4 | A5 | A7
thread "Thread1" size "M7x1" class "6H" standard "ANSI Metric M Profile" full length
thread "Thread2" size "M7x1" class "6H" standard "ANSI Metric M Profile" full length
thread "Thread3" size "M7x1" class "6H" standard "ANSI Metric M Profile" full length
thread "Thread4" size "M7x1" class "6H" standard "ANSI Metric M Profile" full length
sketch "Sketch5" plane through (0, 17.125, 0) normal (0, -1, 0) x (1, 0, 0)
  line L0 (200, -750) -> (67, -750)
  line L1 (67, -750) -> (200, -750)
  line L2 (200, -750) -> (200, -650.0001)
  line L3 (200, -650.0001) -> (67, -650.0001)
  line L4 (67, -600) -> (67, -650)
  line L5 (0, -750) -> (0, -650)
  arc A0 (67, -600) -> (0, -650) centre (63.2865, -664.914) ccw
  arc A1 (0, -750) -> (67, -800) centre (63.932, -734.2212) ccw
  arc A2 (0, -750) -> (67, -800) centre (63.932, -734.2212) ccw
  line L6 (0, -650) -> (0, -750)
  line L7 (67, -750) -> (67, -800)
  line L8 (67, -600) -> (67, -650)
  point P0 (0, 0)
sketch "Sketch6" plane through (0, 50, 0) normal (0, 1, 0) x (1, 0, 0)
  arc A0 (0, 650) -> (67, 600) centre (63.9339, 665.7814) ccw projected
  line L0 (0, 750) -> (0, 650) projected
  line L1 (0, 650) -> (0, 750)
  line L2 (67, 650) -> (200, 650) projected
  line L3 (67, 650) -> (200, 650)
  line L4 (200, 650) -> (200, 750)
  line L5 (200, 750) -> (67, 750)
  line L6 (67, 750) -> (67, 800)
  line L7 (67, 600) -> (67, 650) projected
  line L8 (67, 650) -> (67, 600)
  arc A1 (0, 650) -> (67, 600) centre (63.9339, 665.7814) ccw
  arc A2 (67, 800) -> (0, 750) centre (63.932, 734.2212) ccw projected
  arc A3 (67, 800) -> (0, 750) centre (63.932, 734.2212) ccw
  point P0 (0, 0)
  dimension "d44" = 50
extrude "Extrusion5" cut sketch "Sketch6" against normal blind 16.5
sketch "Sketch7" plane through (0, 33.5, 0) normal (0, 1, 0) x (1, 0, 0)
  line L0 (200, 750) -> (67, 750) projected
  line L1 (200, 750) -> (200, 745)
  line L2 (0, 750) -> (0, 650) projected
  line L3 (200, 745) -> (195, 745)
  line L4 (67, 650) -> (200, 650) projected
  line L5 (195, 650) -> (195, 655)
  line L6 (195, 655) -> (67, 655)
  line L7 (195, 655) -> (195, 745)
  line L8 (200, 650) -> (200, 750) projected
  line L9 (195, 745) -> (67, 745)
  line L10 (67, 745) -> (67, 655)
  line L11 (67, 800.7968) -> (62, 800.7968)
  line L12 (62, 800.7968) -> (62, 600)
  line L13 (67, 650) -> (67, 655)
  line L14 (67, 655) -> (62, 650)
  line L15 (67, 750) -> (62, 755)
  line L16 (0, 750) -> (5, 750)
  arc A0 (67, 800) -> (0, 750) centre (63.932, 734.2212) ccw projected
  line L17 (62, 800.0432) -> (65.8623, 800.1565)
  line L18 (65.8623, 800.1565) -> (67, 800)
  line L19 (67, 800) -> (62, 800.0432)
  line L20 (67, 800) -> (67, 750)
  line L21 (0, 750) -> (0, 650)
  line L22 (0, 650) -> (5, 650)
  line L23 (5, 650) -> (5, 750)
  arc A1 (62, 800.0432) -> (5, 750) centre (81.2834, 720.5955) ccw
  line L24 (62, 650) -> (62, 600)
  arc A2 (0, 650) -> (67, 600) centre (63.9339, 665.7814) ccw projected
  line L25 (62, 600) -> (67, 600)
  line L26 (67, 600) -> (67, 600)
  line L27 (67, 650) -> (67, 600)
  arc A3 (5, 650) -> (62, 600) centre (82.4475, 680.8001) ccw
  line L28 (67, 750) -> (67, 650)
  point P0 (0, 0)
  dimension "d47" = 5
  dimension "d48" = 5
  dimension "d49" = 5
  dimension "d50" = 5
  dimension "d51" = 5
extrude "Extrusion6" cut sketch "Sketch7" against normal blind 25.75 contours L28 L10 L14 L12 L15 | L12 A3 L23 A1 | L9 L7 L6 L10
sketch "Sketch8" plane through (0, 10, 0) normal (0, 1, 0) x (1, 0, 0)
  line L0 (61.7939, 200) -> (62.0007, 200) projected
  arc A0 (61.7939, 200) -> (5, 150) centre (102.4081, 96.6117) ccw projected
  line L1 (5, 50) -> (5, 150) projected
  arc A1 (5, 50) -> (62.0007, 0.0243) centre (106.1149, 107.8339) ccw projected
  line L2 (62.0007, 50) -> (62.0007, 0.0243) projected
  line L3 (62, 50) -> (62.0007, 50) projected
  line L4 (67, 55) -> (62, 50) projected
  line L5 (195, 55) -> (67, 55) projected
  line L6 (195, 145) -> (195, 55) projected
  line L7 (67, 145) -> (195, 145) projected
  line L8 (62, 150) -> (67, 145) projected
  line L9 (62.0007, 200) -> (62, 150) projected
  line L10 (67, 650) -> (67, 600) projected
  arc A2 (0, 650) -> (67, 600) centre (63.9339, 665.7814) ccw projected
  line L11 (0, 650) -> (0, 750) projected
  arc A3 (67, 800) -> (62, 800.0432) centre (63.932, 734.2212) ccw projected
  arc A4 (62, 800.0432) -> (5, 750) centre (81.2834, 720.5955) ccw projected
  line L12 (5, 750) -> (5, 650) projected
  arc A5 (5, 650) -> (62, 600) centre (82.4475, 680.8001) ccw projected
  line L13 (62, 600) -> (62, 650) projected
  line L14 (62, 650) -> (67, 655) projected
  line L15 (67, 655) -> (195, 655) projected
  line L16 (195, 655) -> (195, 745) projected
  line L17 (195, 745) -> (67, 745) projected
  line L18 (67, 745) -> (67, 750) projected
  line L19 (67, 800) -> (67, 750) projected
  arc A6 (62, 800.0432) -> (0, 750) centre (63.932, 734.2212) ccw projected
  line L20 (62, 755) -> (62, 800.0432) projected
  line L21 (67, 750) -> (62, 755) projected
  line L22 (67, 750) -> (200, 750) projected
  line L23 (200, 750) -> (200, 650) projected
  line L24 (200, 650) -> (67, 650) projected
  line L25 (67, 150) -> (200, 150) projected
  line L26 (200, 150) -> (200, 50) projected
  line L27 (200, 50) -> (67, 50) projected
  line L28 (67, 50) -> (67, 0) projected
  line L29 (67, 0) -> (60.8639, 0) projected
  arc A7 (0, 50) -> (60.8639, 0) centre (63.932, 65.7788) ccw projected
  line L30 (0, 50) -> (0, 150) projected
  arc A8 (60.8677, 200) -> (0, 150) centre (63.9339, 134.2186) ccw projected
  line L31 (60.8677, 200) -> (67, 200) projected
  line L32 (67, 200) -> (67, 150) projected
  line L33 (67, 650) -> (67, 600) projected
  arc A9 (0, 650) -> (67, 600) centre (63.9339, 665.7814) ccw projected
  line L34 (0, 650) -> (0, 750) projected
  arc A10 (67, 800) -> (62, 800.0432) centre (63.932, 734.2212) ccw projected
  arc A11 (62, 800.0432) -> (5, 750) centre (81.2834, 720.5955) ccw projected
  line L35 (5, 750) -> (5, 650) projected
  arc A12 (5, 650) -> (62, 600) centre (82.4475, 680.8001) ccw projected
  line L36 (62, 600) -> (62, 650) projected
  line L37 (62, 650) -> (67, 655) projected
  line L38 (67, 655) -> (195, 655) projected
  line L39 (195, 655) -> (195, 745) projected
  line L40 (195, 745) -> (67, 745) projected
  line L41 (67, 745) -> (67, 750) projected
  line L42 (67, 800) -> (67, 750) projected
  arc A13 (62, 800.0432) -> (0, 750) centre (63.932, 734.2212) ccw projected
  line L43 (62, 755) -> (62, 800.0432) projected
  line L44 (67, 750) -> (62, 755) projected
  line L45 (67, 750) -> (200, 750) projected
  line L46 (200, 750) -> (200, 650) projected
  line L47 (200, 650) -> (67, 650) projected
  line L48 (67, 150) -> (200, 150) projected
  line L49 (200, 150) -> (200, 50) projected
  line L50 (200, 50) -> (67, 50) projected
  line L51 (67, 50) -> (67, 0) projected
  line L52 (67, 0) -> (60.8639, 0) projected
  arc A14 (0, 50) -> (60.8639, 0) centre (63.932, 65.7788) ccw projected
  line L53 (0, 50) -> (0, 150) projected
  arc A15 (60.8677, 200) -> (0, 150) centre (63.9339, 134.2186) ccw projected
  line L54 (60.8677, 200) -> (67, 200) projected
  line L55 (67, 200) -> (67, 150) projected
  line L56 (67, 650) -> (77, 650)
  line L57 (77, 650) -> (77, 640)
  line L58 (77, 640) -> (67, 640)
  line L59 (67, 640) -> (67, 650)
  line L60 (200, 650) -> (190, 650)
  line L61 (190, 650) -> (190, 640)
  line L62 (190, 640) -> (200, 640)
  line L63 (200, 640) -> (200, 650)
  line L64 (67, 750) -> (77, 750)
  line L65 (77, 750) -> (77, 760)
  line L66 (77, 760) -> (67, 760)
  line L67 (67, 760) -> (67, 750)
  line L68 (200, 750) -> (190, 750)
  line L69 (190, 750) -> (190, 760)
  line L70 (190, 760) -> (200, 760)
  line L71 (200, 760) -> (200, 750)
  circle A16 centre (72, 755) radius 5
  circle A17 centre (195, 755) radius 5
  circle A18 centre (72, 645) radius 5
  circle A19 centre (195, 645) radius 5
  point P0 (0, 0)
  point P1 (77, 755)
  point P2 (67, 755)
  point P3 (200, 755)
  point P4 (190, 755)
  point P5 (190, 645)
  point P6 (200, 645)
  point P7 (67, 645)
  point P8 (77, 645)
  dimension "d54" = 10
  dimension "d55" = 10
  dimension "d56" = 10
  dimension "d57" = 10
  dimension "d58" = 10
  dimension "d59" = 10
extrude "Extrusion7" add sketch "Sketch8" along normal mid plane 5.75 contours L10 L24 A18 | A18 | L24 L57 A18 | L24 A19 L61 | L24 L63 A19 | A19 | L19 A16 L22 | A16 | A16 L65 L22 | L22 A17 L71 | L22 L69 A17 | A17
sketch "Sketch9" plane through (0, 12.875, 0) normal (0, 1, 0) x (1, 0, 0)
  arc A0 (67, 645) -> (77, 645) centre (72, 645) ccw projected
  line L0 (72, 640) -> (72, 644.269)
  circle A1 centre (72, 644.269) radius 3.375
  arc A2 (190, 645) -> (200, 645) centre (195, 645) ccw projected
  line L1 (195, 640) -> (195, 644.269)
  circle A3 centre (195, 644.269) radius 3.375
  arc A4 (200, 755) -> (190, 755) centre (195, 755) ccw projected
  line L2 (195, 760) -> (195, 755.731)
  circle A5 centre (195, 755.731) radius 3.375
  line L3 (72, 760) -> (72, 755.731)
  circle A6 centre (72, 755.731) radius 3.375
  point P0 (0, 0)
  dimension "d62" = 4.269
  dimension "d63" = 6.75
  dimension "d64" = 4.269
  dimension "d65" = 6.75
extrude "Extrusion8" cut sketch "Sketch9" against normal blind 5.75
thread "Thread5" size "M7x1" class "6H" standard "ANSI Metric M Profile" full length
thread "Thread6" size "M7x1" class "6H" standard "ANSI Metric M Profile" full length
thread "Thread7" size "M7x1" class "6H" standard "ANSI Metric M Profile" full length
thread "Thread8" size "M7x1" class "6H" standard "ANSI Metric M Profile" full length
sketch "Sketch10" plane through (200, 0, -150) normal (0, 0, -1) x (-1, 0, 0)
  point P0 (200, 0)
